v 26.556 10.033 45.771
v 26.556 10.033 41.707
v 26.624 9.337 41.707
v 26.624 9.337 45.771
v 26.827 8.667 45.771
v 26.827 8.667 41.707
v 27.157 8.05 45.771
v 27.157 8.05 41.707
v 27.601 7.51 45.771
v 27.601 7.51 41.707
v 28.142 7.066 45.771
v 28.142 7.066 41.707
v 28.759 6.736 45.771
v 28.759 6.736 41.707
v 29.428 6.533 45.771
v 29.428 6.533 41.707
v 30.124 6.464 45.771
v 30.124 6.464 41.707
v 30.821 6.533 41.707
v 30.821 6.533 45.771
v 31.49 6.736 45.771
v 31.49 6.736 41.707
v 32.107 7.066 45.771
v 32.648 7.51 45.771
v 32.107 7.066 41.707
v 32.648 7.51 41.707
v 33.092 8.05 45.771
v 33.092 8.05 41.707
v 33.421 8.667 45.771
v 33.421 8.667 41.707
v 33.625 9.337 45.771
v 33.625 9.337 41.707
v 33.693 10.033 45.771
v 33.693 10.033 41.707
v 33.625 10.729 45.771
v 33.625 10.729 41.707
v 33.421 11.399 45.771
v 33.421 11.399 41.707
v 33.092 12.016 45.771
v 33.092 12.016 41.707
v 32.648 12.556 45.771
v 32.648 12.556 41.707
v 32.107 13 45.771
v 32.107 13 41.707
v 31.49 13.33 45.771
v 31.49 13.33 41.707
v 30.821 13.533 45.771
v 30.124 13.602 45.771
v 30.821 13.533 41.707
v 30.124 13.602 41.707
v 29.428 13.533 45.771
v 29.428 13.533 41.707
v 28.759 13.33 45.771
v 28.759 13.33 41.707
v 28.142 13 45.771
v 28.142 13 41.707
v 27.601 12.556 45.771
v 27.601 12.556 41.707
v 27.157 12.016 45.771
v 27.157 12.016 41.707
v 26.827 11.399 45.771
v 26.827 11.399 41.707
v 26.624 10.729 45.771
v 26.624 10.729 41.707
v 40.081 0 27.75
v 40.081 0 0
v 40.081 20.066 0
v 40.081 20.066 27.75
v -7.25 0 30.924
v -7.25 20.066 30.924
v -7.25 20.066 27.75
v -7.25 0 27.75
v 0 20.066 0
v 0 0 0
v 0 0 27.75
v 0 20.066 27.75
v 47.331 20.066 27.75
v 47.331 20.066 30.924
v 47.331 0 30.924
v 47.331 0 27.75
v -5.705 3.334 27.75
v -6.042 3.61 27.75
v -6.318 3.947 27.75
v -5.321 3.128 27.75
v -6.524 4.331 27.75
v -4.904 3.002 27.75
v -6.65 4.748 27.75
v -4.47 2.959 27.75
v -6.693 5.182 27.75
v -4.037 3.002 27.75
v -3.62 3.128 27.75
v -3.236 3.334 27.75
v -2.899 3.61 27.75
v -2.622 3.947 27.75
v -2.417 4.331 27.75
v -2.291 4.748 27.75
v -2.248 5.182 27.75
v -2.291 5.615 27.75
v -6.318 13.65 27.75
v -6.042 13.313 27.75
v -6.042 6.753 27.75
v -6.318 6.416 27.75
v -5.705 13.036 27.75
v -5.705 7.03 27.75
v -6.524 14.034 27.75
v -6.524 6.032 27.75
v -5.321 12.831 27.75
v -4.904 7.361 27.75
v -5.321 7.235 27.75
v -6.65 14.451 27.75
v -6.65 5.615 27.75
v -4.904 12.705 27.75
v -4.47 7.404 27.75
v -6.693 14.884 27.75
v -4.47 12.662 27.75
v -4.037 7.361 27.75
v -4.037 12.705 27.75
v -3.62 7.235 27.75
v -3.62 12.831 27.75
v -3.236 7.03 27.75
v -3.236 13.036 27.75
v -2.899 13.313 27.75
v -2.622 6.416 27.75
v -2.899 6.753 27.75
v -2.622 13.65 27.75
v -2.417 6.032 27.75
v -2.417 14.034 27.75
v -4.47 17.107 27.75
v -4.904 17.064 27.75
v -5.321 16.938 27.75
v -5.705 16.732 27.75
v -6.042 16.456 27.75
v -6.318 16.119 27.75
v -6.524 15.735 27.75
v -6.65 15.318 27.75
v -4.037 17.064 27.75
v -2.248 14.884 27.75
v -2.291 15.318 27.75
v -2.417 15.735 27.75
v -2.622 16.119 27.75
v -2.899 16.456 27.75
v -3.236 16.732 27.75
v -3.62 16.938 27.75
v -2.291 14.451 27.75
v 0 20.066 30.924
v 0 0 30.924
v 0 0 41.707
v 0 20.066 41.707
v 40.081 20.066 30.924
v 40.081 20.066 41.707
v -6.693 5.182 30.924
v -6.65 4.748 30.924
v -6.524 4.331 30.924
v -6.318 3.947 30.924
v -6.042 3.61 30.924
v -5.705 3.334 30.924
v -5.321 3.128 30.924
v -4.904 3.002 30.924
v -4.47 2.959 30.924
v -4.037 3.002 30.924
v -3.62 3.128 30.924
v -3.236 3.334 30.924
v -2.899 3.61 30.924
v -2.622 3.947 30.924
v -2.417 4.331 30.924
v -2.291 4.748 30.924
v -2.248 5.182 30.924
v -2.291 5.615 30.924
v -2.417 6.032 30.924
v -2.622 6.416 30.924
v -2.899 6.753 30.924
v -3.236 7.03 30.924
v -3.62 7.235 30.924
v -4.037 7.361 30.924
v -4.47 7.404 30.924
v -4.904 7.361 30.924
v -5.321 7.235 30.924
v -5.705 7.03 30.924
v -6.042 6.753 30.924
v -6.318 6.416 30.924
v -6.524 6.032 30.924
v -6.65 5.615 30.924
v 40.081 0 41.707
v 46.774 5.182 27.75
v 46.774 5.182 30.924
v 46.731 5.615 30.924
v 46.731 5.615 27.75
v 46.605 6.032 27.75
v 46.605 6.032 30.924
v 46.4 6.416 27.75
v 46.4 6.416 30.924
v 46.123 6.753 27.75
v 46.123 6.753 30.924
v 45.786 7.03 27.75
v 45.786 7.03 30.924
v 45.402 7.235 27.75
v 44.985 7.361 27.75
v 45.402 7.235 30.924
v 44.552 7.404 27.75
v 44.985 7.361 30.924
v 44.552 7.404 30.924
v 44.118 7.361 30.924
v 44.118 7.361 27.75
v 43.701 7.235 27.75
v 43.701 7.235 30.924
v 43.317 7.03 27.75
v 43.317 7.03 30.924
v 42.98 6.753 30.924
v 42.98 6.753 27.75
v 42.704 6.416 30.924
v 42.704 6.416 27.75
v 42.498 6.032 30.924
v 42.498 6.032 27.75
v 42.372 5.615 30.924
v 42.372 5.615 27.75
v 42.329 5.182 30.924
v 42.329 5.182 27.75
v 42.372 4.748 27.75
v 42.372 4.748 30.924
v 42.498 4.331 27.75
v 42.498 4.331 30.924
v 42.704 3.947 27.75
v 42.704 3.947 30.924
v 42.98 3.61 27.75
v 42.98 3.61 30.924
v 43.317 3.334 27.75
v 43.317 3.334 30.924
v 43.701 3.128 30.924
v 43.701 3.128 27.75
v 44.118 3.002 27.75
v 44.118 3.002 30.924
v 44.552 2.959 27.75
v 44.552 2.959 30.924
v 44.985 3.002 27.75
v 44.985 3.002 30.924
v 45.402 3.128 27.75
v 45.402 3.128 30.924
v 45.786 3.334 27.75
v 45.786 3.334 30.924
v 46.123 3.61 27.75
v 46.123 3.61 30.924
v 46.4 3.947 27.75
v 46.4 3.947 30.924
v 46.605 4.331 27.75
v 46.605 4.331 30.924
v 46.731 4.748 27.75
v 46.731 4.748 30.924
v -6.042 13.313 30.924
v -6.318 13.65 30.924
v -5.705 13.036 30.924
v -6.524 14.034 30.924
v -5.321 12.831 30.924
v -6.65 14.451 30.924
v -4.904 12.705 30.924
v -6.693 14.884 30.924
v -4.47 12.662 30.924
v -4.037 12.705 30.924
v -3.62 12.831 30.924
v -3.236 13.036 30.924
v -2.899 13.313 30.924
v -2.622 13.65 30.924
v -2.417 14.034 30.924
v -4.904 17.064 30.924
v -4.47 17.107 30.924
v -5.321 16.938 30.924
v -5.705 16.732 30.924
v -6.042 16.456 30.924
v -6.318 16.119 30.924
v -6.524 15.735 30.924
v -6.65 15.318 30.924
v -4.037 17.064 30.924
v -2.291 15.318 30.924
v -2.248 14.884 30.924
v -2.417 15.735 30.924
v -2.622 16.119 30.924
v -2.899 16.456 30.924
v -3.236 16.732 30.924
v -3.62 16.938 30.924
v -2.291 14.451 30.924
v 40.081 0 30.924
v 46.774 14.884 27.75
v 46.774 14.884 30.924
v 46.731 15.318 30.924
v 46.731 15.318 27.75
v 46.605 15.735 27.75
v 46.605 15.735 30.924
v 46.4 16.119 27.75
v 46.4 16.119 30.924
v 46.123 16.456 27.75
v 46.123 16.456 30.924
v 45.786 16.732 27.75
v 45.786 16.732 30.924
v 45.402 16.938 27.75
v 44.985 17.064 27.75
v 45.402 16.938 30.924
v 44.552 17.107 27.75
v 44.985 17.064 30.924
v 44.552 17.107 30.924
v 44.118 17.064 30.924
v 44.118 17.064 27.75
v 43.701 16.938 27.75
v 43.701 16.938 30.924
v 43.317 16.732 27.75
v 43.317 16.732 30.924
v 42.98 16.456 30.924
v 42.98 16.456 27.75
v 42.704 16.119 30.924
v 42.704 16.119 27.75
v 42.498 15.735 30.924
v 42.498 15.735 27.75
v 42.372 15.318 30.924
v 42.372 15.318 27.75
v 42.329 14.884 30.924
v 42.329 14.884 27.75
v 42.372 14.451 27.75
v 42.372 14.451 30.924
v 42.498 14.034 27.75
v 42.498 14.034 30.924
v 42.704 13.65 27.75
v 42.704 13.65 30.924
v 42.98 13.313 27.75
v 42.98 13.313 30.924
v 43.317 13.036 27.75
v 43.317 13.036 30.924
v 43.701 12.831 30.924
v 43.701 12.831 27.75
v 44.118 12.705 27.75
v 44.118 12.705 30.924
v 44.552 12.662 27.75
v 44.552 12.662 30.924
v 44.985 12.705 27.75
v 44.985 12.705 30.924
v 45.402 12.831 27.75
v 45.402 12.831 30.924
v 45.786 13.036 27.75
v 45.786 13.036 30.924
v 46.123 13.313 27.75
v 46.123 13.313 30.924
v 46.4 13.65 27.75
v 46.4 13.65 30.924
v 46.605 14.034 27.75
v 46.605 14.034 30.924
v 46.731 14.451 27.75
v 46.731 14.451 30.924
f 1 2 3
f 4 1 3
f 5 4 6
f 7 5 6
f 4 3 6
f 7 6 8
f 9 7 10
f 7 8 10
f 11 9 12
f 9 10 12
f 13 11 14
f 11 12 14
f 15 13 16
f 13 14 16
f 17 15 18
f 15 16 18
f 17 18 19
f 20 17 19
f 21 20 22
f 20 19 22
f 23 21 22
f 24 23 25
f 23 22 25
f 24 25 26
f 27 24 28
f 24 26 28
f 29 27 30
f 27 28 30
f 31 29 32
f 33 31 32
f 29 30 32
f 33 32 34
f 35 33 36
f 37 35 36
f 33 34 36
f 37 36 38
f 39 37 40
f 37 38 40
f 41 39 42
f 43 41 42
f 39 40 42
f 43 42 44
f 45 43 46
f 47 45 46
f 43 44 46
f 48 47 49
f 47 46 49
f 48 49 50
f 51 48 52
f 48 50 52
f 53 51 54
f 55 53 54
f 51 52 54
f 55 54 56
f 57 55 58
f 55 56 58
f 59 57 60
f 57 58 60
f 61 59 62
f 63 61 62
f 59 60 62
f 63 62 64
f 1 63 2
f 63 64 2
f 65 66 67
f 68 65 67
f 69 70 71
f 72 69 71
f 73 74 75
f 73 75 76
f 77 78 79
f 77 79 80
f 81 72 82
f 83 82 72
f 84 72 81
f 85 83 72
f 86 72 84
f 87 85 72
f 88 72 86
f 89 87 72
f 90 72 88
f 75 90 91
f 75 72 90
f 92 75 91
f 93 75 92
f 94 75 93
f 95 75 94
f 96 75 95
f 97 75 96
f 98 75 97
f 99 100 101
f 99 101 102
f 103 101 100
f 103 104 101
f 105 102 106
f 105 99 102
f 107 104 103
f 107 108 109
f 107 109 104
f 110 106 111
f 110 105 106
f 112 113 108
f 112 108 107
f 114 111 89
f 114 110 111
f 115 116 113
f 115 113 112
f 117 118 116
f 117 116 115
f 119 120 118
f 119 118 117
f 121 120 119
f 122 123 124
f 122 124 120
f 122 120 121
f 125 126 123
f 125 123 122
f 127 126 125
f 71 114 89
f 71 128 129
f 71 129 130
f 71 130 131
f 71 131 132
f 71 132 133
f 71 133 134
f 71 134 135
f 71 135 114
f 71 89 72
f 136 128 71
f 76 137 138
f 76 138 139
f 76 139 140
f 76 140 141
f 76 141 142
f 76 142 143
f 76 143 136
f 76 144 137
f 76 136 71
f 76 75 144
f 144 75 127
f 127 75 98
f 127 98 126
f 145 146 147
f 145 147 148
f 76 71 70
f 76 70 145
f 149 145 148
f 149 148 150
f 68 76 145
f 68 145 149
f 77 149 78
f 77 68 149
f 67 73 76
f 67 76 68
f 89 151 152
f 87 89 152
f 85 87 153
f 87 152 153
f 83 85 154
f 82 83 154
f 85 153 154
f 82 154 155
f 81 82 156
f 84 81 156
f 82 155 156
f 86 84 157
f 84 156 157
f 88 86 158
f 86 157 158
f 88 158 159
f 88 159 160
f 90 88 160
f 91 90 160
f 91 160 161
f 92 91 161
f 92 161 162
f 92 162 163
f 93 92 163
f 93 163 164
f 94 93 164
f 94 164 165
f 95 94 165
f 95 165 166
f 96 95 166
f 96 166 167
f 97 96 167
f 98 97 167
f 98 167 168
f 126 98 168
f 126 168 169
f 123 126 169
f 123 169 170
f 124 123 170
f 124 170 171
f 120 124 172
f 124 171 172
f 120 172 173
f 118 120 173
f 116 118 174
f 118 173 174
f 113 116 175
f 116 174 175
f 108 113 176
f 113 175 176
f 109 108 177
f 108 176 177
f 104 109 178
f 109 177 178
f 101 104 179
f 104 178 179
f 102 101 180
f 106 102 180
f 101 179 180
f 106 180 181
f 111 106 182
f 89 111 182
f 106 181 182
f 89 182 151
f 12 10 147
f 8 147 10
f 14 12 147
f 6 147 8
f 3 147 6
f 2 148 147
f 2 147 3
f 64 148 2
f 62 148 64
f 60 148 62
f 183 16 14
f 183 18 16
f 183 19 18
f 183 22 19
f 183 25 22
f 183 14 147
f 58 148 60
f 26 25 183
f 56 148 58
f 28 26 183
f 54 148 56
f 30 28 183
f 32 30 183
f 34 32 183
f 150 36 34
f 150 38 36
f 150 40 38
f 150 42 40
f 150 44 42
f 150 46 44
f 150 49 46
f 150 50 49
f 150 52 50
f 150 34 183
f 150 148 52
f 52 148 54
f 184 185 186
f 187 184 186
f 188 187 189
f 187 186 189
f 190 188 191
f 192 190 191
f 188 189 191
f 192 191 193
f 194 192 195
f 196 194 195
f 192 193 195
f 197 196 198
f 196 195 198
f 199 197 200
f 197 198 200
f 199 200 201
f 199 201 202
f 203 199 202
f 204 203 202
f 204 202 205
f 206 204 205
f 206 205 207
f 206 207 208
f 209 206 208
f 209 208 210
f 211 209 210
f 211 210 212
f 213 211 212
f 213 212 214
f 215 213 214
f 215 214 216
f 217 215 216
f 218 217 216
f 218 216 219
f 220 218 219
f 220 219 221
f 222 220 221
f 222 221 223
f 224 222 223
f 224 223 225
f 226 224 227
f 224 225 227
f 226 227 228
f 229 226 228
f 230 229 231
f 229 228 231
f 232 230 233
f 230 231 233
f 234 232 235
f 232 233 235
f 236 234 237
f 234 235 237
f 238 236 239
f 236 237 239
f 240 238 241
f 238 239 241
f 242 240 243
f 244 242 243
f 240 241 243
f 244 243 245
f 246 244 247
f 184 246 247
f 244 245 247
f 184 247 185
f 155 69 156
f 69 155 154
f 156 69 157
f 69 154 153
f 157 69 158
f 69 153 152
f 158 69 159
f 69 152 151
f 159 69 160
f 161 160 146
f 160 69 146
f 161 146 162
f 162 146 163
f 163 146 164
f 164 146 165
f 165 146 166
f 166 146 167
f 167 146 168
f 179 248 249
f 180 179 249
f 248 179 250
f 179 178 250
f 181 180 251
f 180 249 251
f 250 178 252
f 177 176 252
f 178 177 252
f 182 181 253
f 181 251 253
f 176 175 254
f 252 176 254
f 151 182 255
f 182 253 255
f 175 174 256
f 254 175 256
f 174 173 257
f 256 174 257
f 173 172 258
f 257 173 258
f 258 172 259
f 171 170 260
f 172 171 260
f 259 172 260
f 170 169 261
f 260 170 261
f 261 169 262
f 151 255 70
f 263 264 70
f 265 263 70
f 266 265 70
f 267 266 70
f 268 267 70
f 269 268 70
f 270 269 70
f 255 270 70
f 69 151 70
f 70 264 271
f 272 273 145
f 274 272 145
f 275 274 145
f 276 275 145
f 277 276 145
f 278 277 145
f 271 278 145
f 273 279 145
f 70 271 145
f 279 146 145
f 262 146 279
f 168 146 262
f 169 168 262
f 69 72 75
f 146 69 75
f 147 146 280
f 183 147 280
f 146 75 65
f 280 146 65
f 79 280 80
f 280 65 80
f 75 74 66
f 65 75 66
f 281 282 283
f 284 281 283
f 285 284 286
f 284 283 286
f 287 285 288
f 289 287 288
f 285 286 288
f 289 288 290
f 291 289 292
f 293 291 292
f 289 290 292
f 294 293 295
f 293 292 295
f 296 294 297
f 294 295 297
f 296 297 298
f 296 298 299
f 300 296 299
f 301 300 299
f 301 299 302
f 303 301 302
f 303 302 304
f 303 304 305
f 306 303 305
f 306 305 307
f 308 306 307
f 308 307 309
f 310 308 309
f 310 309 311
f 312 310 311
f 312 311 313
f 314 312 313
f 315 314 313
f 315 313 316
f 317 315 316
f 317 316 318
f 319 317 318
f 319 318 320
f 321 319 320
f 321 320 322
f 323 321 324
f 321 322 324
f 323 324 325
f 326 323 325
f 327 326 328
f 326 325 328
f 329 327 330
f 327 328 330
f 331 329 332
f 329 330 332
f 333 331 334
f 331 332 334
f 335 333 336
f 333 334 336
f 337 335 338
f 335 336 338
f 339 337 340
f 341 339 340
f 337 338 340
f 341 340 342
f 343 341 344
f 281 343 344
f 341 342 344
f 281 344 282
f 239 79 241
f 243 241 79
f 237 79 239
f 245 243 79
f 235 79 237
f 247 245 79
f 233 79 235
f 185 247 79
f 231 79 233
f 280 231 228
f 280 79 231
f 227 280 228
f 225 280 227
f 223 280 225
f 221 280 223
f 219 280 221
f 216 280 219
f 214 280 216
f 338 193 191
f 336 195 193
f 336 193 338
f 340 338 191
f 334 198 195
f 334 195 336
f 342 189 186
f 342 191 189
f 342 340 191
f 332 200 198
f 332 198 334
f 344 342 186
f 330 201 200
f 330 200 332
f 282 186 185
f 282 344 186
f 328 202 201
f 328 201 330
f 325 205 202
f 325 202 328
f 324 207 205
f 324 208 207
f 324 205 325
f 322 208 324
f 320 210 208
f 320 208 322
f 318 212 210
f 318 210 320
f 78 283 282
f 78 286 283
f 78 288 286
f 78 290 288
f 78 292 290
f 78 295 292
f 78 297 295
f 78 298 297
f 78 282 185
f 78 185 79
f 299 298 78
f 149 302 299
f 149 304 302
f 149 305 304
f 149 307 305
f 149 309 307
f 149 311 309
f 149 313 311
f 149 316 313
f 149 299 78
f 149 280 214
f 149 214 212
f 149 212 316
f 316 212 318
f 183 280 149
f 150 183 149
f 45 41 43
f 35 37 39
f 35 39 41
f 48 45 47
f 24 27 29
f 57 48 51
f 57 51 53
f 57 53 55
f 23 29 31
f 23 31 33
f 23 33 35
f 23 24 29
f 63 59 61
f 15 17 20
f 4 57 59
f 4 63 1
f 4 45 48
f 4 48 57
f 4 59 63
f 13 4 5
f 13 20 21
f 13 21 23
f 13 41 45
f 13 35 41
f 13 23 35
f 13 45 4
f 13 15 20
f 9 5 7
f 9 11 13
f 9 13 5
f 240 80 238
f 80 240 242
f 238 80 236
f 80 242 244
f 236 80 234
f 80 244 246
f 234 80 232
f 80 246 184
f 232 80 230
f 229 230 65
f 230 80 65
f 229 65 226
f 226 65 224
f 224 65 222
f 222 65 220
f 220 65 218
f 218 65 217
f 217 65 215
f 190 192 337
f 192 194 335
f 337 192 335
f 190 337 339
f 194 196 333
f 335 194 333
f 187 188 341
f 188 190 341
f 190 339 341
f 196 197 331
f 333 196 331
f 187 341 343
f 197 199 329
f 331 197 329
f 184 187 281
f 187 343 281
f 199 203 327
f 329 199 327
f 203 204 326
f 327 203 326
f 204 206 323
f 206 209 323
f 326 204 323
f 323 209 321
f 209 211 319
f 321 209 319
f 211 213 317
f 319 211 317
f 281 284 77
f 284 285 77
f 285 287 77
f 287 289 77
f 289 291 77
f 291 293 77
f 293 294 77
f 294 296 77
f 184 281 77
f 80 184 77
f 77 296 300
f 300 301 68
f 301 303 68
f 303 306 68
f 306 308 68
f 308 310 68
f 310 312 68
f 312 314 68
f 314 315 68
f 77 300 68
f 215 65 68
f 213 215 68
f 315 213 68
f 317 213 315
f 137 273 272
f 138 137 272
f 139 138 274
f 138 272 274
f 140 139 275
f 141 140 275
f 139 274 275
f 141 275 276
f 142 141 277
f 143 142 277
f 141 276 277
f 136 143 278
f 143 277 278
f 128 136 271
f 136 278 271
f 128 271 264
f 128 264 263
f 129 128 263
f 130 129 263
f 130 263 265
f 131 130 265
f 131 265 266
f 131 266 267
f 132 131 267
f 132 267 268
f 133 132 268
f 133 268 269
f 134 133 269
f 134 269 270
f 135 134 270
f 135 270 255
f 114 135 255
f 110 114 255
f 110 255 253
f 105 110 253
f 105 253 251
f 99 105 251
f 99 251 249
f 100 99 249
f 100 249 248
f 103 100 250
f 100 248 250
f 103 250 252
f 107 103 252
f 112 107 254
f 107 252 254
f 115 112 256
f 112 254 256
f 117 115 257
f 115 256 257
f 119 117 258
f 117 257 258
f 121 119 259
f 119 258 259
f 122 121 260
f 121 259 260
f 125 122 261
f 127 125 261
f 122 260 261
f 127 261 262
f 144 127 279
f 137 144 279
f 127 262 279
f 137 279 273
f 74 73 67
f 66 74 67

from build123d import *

# Parameters (mm, degrees)
SKETCH1_W           = 40.0812
SKETCH1_H           = 20.066
BOSS_EXTRUDE1_DEPTH = 41.7068
SKETCH2_W           = 3.175
SKETCH2_H           = 20.066
BOSS_EXTRUDE2_DEPTH = 7.25
CUT_EXTRUDE1_REACH  = 61.993
SKETCH3_R           = 2.2225
SKETCH4_R           = 3.5687
BOSS_EXTRUDE3_DEPTH = 4.064


with BuildPart() as part:
    # Sketch1 → Boss-Extrude1 (new body)
    with BuildSketch(Plane.XY):
        with Locations((20.0406, 10.033)):
            Rectangle(SKETCH1_W, SKETCH1_H)
    extrude(amount=BOSS_EXTRUDE1_DEPTH)

    # Sketch2 → Boss-Extrude2 (add)
    with BuildSketch(Plane(origin=(40.0812, 0, 0), x_dir=(0, 0, -1), z_dir=(1, 0, 0))):
        with Locations((-29.337, 10.033)):
            Rectangle(SKETCH2_W, SKETCH2_H)
    boss_extrude2 = extrude(amount=BOSS_EXTRUDE2_DEPTH)

    # Mirror1: Boss-Extrude2 across plane
    add(boss_extrude2.mirror(Plane.ZY.offset(-20.0406)))

    # Sketch3 → Cut-Extrude1 (cut, up to next)
    with BuildSketch(Plane.XY.offset(30.9245), mode=Mode.PRIVATE) as cut_extrude1_sk1:
        with Locations((44.5516, 5.1816)):
            Circle(SKETCH3_R)
    cut_extrude1_tool1 = extrude(cut_extrude1_sk1.sketch, amount=-CUT_EXTRUDE1_REACH, mode=Mode.PRIVATE) & part.part
    # Sketch3 → Cut-Extrude1 (cut, up to next)
    with BuildSketch(Plane.XY.offset(30.9245), mode=Mode.PRIVATE) as cut_extrude1_sk2:
        with Locations(Location((-4.4704, 5.1816, 0), (0, 0, 180))):
            Circle(SKETCH3_R)
    cut_extrude1_tool2 = extrude(cut_extrude1_sk2.sketch, amount=-CUT_EXTRUDE1_REACH, mode=Mode.PRIVATE) & part.part
    # Sketch3 → Cut-Extrude1 (cut, up to next)
    with BuildSketch(Plane.XY.offset(30.9245), mode=Mode.PRIVATE) as cut_extrude1_sk3:
        with Locations((-4.4704, 14.8844)):
            Circle(SKETCH3_R)
    cut_extrude1_tool3 = extrude(cut_extrude1_sk3.sketch, amount=-CUT_EXTRUDE1_REACH, mode=Mode.PRIVATE) & part.part
    # Sketch3 → Cut-Extrude1 (cut, up to next)
    with BuildSketch(Plane.XY.offset(30.9245), mode=Mode.PRIVATE) as cut_extrude1_sk4:
        with Locations((44.5516, 14.8844)):
            Circle(SKETCH3_R)
    cut_extrude1_tool4 = extrude(cut_extrude1_sk4.sketch, amount=-CUT_EXTRUDE1_REACH, mode=Mode.PRIVATE) & part.part
    add(cut_extrude1_tool1.solids().sort_by_distance((44.5516, 5.1816, 30.9245))[0], mode=Mode.SUBTRACT)
    add(cut_extrude1_tool2.solids().sort_by_distance((-4.4704, 5.1816, 30.9245))[0], mode=Mode.SUBTRACT)
    add(cut_extrude1_tool3.solids().sort_by_distance((-4.4704, 14.8844, 30.9245))[0], mode=Mode.SUBTRACT)
    add(cut_extrude1_tool4.solids().sort_by_distance((44.5516, 14.8844, 30.9245))[0], mode=Mode.SUBTRACT)

    # Sketch4 → Boss-Extrude3 (add)
    with BuildSketch(Plane.XY.offset(41.7068)):
        with Locations(Location((30.1244, 10.033, 0), (0, 0, 180))):
            Circle(SKETCH4_R)
    extrude(amount=BOSS_EXTRUDE3_DEPTH)


solid = part.part
